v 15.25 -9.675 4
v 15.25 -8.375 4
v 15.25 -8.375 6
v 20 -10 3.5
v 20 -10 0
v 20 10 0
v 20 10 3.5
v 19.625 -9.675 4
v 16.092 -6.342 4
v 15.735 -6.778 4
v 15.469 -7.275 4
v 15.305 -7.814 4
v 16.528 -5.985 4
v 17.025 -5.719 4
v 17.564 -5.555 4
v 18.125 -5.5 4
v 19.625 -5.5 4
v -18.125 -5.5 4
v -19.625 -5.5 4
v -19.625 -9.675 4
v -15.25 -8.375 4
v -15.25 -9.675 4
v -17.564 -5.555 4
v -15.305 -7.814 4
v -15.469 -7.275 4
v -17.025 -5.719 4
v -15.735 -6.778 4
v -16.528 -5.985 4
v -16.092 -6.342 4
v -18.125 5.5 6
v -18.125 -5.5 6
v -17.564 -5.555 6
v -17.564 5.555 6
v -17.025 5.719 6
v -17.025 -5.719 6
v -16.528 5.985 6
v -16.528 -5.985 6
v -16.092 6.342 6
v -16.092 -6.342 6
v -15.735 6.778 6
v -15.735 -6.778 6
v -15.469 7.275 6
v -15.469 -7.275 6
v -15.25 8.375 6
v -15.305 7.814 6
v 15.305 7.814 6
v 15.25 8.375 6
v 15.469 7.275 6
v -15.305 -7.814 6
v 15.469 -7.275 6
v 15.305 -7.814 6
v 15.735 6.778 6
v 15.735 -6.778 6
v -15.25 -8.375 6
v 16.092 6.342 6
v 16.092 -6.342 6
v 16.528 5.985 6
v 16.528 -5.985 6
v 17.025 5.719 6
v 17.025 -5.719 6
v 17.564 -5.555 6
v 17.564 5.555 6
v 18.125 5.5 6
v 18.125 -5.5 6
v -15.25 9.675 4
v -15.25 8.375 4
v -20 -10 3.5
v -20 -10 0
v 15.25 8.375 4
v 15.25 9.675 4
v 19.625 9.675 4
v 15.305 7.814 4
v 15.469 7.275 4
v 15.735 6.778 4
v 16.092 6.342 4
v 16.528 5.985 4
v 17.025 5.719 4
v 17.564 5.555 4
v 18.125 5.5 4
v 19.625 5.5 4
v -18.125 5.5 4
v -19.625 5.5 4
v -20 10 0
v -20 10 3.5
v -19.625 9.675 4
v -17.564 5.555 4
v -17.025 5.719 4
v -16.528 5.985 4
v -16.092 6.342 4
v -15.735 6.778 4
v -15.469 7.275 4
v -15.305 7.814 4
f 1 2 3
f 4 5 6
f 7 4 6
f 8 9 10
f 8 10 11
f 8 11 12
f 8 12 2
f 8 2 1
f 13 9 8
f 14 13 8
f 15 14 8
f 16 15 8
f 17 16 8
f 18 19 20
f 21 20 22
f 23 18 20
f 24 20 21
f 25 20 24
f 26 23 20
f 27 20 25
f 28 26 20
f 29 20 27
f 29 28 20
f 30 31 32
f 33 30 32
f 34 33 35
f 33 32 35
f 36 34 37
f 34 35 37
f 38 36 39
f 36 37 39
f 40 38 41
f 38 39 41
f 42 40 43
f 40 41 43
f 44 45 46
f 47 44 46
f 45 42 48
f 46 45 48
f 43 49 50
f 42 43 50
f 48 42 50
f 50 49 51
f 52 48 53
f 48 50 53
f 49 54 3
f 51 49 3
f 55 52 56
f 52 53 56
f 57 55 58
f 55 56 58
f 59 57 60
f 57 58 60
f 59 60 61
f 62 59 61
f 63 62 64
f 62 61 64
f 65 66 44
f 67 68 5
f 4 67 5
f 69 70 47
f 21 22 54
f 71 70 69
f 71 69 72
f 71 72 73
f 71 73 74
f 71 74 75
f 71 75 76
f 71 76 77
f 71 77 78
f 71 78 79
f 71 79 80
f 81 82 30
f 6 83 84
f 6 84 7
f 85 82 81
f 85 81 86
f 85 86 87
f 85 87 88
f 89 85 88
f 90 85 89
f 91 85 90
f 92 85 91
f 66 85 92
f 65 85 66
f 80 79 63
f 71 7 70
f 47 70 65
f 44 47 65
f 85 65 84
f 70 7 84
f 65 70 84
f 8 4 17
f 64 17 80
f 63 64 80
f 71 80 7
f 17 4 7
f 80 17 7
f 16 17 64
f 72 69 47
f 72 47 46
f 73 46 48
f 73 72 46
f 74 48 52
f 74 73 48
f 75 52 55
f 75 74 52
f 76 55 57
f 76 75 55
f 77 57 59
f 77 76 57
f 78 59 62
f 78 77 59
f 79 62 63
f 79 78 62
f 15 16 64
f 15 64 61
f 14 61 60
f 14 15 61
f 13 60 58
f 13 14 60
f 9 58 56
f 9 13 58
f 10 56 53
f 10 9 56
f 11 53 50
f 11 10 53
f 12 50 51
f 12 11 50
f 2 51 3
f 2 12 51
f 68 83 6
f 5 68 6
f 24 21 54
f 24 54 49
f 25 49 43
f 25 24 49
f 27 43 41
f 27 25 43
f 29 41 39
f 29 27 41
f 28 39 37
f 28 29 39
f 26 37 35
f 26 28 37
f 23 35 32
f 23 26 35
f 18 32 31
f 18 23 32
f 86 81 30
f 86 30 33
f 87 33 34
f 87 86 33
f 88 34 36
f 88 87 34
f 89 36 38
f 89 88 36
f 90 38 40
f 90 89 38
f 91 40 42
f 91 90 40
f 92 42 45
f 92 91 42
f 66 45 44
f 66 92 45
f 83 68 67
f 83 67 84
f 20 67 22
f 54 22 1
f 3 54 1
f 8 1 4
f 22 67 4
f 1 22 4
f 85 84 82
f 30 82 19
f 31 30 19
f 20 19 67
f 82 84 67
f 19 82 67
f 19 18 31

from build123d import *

# Parameters (mm, degrees)
SKETCH1_W           = 39.99992
SKETCH1_H           = 19.99996
BOSS_EXTRUDE1_DEPTH = 3.499993
CUT_EXTRUDE1_START  = -2.00000108
CUT_EXTRUDE1_DEPTH  = 2.00000108


# Read off the part's stored shape, not the designer's step: Cut-Extrude1
with BuildPart() as part:
    # Sketch1 → Boss-Extrude1 (new body)
    with BuildSketch(Plane.XY):
        Rectangle(SKETCH1_W, SKETCH1_H)
    extrude(amount=BOSS_EXTRUDE1_DEPTH)

    # Sketch3 → section 0 of loft1
    with BuildSketch(Plane.XY.offset(5.99999308), mode=Mode.PRIVATE) as loft1_s0:
        with BuildLine():
            Line((-18.12500058, -8.375000014), (18.12500058, -8.375000014))
            Line((18.12500058, -8.375000014), (18.12500058, 8.375000014))
            Line((18.12500058, 8.375000014), (-18.12500058, 8.375000014))
            Line((-18.12500058, 8.375000014), (-18.12500058, -8.375000014))
        make_face()
    # loft up to a face of the part (loft1)
    loft([loft1_s0.sketch, part.faces().sort_by_distance((0, 0, 3.499993))[0]])

    # Cut-Extrude1 outline → Cut-Extrude1 (cut)
    with BuildSketch(Plane.XY.offset(5.99999308).offset(CUT_EXTRUDE1_START)):
        with BuildLine():
            ThreePointArc((-15.250002266, -8.375000014), (-16.092069776, -6.34206921), (-18.12500058, -5.5000017))
            Line((-18.12500058, -5.5000017), (-19.99996, -5.5000017))
            Line((-19.99996, -5.5000017), (-19.99996, -9.99998))
            Line((-19.99996, -9.99998), (-15.250002266, -9.99998))
            Line((-15.250002266, -9.99998), (-15.250002266, -8.375000014))
        make_face()
        with BuildLine():
            ThreePointArc((18.12500058, -5.5000017), (16.092069776, -6.34206921), (15.250002266, -8.375000014))
            Line((15.250002266, -8.375000014), (15.250002266, -9.99998))
            Line((15.250002266, -9.99998), (19.99996, -9.99998))
            Line((19.99996, -9.99998), (19.99996, -5.5000017))
            Line((19.99996, -5.5000017), (18.12500058, -5.5000017))
        make_face()
        with BuildLine():
            ThreePointArc((-18.12500058, 5.5000017), (-16.092069776, 6.34206921), (-15.250002266, 8.375000014))
            Line((-15.250002266, 8.375000014), (-15.250002266, 9.99998))
            Line((-15.250002266, 9.99998), (-19.99996, 9.99998))
            Line((-19.99996, 9.99998), (-19.99996, 5.5000017))
            Line((-19.99996, 5.5000017), (-18.12500058, 5.5000017))
        make_face()
        with BuildLine():
            ThreePointArc((15.250002266, 8.375000014), (16.092069776, 6.34206921), (18.12500058, 5.5000017))
            Line((18.12500058, 5.5000017), (19.99996, 5.5000017))
            Line((19.99996, 5.5000017), (19.99996, 9.99998))
            Line((19.99996, 9.99998), (15.250002266, 9.99998))
            Line((15.250002266, 9.99998), (15.250002266, 8.375000014))
        make_face()
    extrude(amount=CUT_EXTRUDE1_DEPTH, mode=Mode.SUBTRACT)


solid = part.part
